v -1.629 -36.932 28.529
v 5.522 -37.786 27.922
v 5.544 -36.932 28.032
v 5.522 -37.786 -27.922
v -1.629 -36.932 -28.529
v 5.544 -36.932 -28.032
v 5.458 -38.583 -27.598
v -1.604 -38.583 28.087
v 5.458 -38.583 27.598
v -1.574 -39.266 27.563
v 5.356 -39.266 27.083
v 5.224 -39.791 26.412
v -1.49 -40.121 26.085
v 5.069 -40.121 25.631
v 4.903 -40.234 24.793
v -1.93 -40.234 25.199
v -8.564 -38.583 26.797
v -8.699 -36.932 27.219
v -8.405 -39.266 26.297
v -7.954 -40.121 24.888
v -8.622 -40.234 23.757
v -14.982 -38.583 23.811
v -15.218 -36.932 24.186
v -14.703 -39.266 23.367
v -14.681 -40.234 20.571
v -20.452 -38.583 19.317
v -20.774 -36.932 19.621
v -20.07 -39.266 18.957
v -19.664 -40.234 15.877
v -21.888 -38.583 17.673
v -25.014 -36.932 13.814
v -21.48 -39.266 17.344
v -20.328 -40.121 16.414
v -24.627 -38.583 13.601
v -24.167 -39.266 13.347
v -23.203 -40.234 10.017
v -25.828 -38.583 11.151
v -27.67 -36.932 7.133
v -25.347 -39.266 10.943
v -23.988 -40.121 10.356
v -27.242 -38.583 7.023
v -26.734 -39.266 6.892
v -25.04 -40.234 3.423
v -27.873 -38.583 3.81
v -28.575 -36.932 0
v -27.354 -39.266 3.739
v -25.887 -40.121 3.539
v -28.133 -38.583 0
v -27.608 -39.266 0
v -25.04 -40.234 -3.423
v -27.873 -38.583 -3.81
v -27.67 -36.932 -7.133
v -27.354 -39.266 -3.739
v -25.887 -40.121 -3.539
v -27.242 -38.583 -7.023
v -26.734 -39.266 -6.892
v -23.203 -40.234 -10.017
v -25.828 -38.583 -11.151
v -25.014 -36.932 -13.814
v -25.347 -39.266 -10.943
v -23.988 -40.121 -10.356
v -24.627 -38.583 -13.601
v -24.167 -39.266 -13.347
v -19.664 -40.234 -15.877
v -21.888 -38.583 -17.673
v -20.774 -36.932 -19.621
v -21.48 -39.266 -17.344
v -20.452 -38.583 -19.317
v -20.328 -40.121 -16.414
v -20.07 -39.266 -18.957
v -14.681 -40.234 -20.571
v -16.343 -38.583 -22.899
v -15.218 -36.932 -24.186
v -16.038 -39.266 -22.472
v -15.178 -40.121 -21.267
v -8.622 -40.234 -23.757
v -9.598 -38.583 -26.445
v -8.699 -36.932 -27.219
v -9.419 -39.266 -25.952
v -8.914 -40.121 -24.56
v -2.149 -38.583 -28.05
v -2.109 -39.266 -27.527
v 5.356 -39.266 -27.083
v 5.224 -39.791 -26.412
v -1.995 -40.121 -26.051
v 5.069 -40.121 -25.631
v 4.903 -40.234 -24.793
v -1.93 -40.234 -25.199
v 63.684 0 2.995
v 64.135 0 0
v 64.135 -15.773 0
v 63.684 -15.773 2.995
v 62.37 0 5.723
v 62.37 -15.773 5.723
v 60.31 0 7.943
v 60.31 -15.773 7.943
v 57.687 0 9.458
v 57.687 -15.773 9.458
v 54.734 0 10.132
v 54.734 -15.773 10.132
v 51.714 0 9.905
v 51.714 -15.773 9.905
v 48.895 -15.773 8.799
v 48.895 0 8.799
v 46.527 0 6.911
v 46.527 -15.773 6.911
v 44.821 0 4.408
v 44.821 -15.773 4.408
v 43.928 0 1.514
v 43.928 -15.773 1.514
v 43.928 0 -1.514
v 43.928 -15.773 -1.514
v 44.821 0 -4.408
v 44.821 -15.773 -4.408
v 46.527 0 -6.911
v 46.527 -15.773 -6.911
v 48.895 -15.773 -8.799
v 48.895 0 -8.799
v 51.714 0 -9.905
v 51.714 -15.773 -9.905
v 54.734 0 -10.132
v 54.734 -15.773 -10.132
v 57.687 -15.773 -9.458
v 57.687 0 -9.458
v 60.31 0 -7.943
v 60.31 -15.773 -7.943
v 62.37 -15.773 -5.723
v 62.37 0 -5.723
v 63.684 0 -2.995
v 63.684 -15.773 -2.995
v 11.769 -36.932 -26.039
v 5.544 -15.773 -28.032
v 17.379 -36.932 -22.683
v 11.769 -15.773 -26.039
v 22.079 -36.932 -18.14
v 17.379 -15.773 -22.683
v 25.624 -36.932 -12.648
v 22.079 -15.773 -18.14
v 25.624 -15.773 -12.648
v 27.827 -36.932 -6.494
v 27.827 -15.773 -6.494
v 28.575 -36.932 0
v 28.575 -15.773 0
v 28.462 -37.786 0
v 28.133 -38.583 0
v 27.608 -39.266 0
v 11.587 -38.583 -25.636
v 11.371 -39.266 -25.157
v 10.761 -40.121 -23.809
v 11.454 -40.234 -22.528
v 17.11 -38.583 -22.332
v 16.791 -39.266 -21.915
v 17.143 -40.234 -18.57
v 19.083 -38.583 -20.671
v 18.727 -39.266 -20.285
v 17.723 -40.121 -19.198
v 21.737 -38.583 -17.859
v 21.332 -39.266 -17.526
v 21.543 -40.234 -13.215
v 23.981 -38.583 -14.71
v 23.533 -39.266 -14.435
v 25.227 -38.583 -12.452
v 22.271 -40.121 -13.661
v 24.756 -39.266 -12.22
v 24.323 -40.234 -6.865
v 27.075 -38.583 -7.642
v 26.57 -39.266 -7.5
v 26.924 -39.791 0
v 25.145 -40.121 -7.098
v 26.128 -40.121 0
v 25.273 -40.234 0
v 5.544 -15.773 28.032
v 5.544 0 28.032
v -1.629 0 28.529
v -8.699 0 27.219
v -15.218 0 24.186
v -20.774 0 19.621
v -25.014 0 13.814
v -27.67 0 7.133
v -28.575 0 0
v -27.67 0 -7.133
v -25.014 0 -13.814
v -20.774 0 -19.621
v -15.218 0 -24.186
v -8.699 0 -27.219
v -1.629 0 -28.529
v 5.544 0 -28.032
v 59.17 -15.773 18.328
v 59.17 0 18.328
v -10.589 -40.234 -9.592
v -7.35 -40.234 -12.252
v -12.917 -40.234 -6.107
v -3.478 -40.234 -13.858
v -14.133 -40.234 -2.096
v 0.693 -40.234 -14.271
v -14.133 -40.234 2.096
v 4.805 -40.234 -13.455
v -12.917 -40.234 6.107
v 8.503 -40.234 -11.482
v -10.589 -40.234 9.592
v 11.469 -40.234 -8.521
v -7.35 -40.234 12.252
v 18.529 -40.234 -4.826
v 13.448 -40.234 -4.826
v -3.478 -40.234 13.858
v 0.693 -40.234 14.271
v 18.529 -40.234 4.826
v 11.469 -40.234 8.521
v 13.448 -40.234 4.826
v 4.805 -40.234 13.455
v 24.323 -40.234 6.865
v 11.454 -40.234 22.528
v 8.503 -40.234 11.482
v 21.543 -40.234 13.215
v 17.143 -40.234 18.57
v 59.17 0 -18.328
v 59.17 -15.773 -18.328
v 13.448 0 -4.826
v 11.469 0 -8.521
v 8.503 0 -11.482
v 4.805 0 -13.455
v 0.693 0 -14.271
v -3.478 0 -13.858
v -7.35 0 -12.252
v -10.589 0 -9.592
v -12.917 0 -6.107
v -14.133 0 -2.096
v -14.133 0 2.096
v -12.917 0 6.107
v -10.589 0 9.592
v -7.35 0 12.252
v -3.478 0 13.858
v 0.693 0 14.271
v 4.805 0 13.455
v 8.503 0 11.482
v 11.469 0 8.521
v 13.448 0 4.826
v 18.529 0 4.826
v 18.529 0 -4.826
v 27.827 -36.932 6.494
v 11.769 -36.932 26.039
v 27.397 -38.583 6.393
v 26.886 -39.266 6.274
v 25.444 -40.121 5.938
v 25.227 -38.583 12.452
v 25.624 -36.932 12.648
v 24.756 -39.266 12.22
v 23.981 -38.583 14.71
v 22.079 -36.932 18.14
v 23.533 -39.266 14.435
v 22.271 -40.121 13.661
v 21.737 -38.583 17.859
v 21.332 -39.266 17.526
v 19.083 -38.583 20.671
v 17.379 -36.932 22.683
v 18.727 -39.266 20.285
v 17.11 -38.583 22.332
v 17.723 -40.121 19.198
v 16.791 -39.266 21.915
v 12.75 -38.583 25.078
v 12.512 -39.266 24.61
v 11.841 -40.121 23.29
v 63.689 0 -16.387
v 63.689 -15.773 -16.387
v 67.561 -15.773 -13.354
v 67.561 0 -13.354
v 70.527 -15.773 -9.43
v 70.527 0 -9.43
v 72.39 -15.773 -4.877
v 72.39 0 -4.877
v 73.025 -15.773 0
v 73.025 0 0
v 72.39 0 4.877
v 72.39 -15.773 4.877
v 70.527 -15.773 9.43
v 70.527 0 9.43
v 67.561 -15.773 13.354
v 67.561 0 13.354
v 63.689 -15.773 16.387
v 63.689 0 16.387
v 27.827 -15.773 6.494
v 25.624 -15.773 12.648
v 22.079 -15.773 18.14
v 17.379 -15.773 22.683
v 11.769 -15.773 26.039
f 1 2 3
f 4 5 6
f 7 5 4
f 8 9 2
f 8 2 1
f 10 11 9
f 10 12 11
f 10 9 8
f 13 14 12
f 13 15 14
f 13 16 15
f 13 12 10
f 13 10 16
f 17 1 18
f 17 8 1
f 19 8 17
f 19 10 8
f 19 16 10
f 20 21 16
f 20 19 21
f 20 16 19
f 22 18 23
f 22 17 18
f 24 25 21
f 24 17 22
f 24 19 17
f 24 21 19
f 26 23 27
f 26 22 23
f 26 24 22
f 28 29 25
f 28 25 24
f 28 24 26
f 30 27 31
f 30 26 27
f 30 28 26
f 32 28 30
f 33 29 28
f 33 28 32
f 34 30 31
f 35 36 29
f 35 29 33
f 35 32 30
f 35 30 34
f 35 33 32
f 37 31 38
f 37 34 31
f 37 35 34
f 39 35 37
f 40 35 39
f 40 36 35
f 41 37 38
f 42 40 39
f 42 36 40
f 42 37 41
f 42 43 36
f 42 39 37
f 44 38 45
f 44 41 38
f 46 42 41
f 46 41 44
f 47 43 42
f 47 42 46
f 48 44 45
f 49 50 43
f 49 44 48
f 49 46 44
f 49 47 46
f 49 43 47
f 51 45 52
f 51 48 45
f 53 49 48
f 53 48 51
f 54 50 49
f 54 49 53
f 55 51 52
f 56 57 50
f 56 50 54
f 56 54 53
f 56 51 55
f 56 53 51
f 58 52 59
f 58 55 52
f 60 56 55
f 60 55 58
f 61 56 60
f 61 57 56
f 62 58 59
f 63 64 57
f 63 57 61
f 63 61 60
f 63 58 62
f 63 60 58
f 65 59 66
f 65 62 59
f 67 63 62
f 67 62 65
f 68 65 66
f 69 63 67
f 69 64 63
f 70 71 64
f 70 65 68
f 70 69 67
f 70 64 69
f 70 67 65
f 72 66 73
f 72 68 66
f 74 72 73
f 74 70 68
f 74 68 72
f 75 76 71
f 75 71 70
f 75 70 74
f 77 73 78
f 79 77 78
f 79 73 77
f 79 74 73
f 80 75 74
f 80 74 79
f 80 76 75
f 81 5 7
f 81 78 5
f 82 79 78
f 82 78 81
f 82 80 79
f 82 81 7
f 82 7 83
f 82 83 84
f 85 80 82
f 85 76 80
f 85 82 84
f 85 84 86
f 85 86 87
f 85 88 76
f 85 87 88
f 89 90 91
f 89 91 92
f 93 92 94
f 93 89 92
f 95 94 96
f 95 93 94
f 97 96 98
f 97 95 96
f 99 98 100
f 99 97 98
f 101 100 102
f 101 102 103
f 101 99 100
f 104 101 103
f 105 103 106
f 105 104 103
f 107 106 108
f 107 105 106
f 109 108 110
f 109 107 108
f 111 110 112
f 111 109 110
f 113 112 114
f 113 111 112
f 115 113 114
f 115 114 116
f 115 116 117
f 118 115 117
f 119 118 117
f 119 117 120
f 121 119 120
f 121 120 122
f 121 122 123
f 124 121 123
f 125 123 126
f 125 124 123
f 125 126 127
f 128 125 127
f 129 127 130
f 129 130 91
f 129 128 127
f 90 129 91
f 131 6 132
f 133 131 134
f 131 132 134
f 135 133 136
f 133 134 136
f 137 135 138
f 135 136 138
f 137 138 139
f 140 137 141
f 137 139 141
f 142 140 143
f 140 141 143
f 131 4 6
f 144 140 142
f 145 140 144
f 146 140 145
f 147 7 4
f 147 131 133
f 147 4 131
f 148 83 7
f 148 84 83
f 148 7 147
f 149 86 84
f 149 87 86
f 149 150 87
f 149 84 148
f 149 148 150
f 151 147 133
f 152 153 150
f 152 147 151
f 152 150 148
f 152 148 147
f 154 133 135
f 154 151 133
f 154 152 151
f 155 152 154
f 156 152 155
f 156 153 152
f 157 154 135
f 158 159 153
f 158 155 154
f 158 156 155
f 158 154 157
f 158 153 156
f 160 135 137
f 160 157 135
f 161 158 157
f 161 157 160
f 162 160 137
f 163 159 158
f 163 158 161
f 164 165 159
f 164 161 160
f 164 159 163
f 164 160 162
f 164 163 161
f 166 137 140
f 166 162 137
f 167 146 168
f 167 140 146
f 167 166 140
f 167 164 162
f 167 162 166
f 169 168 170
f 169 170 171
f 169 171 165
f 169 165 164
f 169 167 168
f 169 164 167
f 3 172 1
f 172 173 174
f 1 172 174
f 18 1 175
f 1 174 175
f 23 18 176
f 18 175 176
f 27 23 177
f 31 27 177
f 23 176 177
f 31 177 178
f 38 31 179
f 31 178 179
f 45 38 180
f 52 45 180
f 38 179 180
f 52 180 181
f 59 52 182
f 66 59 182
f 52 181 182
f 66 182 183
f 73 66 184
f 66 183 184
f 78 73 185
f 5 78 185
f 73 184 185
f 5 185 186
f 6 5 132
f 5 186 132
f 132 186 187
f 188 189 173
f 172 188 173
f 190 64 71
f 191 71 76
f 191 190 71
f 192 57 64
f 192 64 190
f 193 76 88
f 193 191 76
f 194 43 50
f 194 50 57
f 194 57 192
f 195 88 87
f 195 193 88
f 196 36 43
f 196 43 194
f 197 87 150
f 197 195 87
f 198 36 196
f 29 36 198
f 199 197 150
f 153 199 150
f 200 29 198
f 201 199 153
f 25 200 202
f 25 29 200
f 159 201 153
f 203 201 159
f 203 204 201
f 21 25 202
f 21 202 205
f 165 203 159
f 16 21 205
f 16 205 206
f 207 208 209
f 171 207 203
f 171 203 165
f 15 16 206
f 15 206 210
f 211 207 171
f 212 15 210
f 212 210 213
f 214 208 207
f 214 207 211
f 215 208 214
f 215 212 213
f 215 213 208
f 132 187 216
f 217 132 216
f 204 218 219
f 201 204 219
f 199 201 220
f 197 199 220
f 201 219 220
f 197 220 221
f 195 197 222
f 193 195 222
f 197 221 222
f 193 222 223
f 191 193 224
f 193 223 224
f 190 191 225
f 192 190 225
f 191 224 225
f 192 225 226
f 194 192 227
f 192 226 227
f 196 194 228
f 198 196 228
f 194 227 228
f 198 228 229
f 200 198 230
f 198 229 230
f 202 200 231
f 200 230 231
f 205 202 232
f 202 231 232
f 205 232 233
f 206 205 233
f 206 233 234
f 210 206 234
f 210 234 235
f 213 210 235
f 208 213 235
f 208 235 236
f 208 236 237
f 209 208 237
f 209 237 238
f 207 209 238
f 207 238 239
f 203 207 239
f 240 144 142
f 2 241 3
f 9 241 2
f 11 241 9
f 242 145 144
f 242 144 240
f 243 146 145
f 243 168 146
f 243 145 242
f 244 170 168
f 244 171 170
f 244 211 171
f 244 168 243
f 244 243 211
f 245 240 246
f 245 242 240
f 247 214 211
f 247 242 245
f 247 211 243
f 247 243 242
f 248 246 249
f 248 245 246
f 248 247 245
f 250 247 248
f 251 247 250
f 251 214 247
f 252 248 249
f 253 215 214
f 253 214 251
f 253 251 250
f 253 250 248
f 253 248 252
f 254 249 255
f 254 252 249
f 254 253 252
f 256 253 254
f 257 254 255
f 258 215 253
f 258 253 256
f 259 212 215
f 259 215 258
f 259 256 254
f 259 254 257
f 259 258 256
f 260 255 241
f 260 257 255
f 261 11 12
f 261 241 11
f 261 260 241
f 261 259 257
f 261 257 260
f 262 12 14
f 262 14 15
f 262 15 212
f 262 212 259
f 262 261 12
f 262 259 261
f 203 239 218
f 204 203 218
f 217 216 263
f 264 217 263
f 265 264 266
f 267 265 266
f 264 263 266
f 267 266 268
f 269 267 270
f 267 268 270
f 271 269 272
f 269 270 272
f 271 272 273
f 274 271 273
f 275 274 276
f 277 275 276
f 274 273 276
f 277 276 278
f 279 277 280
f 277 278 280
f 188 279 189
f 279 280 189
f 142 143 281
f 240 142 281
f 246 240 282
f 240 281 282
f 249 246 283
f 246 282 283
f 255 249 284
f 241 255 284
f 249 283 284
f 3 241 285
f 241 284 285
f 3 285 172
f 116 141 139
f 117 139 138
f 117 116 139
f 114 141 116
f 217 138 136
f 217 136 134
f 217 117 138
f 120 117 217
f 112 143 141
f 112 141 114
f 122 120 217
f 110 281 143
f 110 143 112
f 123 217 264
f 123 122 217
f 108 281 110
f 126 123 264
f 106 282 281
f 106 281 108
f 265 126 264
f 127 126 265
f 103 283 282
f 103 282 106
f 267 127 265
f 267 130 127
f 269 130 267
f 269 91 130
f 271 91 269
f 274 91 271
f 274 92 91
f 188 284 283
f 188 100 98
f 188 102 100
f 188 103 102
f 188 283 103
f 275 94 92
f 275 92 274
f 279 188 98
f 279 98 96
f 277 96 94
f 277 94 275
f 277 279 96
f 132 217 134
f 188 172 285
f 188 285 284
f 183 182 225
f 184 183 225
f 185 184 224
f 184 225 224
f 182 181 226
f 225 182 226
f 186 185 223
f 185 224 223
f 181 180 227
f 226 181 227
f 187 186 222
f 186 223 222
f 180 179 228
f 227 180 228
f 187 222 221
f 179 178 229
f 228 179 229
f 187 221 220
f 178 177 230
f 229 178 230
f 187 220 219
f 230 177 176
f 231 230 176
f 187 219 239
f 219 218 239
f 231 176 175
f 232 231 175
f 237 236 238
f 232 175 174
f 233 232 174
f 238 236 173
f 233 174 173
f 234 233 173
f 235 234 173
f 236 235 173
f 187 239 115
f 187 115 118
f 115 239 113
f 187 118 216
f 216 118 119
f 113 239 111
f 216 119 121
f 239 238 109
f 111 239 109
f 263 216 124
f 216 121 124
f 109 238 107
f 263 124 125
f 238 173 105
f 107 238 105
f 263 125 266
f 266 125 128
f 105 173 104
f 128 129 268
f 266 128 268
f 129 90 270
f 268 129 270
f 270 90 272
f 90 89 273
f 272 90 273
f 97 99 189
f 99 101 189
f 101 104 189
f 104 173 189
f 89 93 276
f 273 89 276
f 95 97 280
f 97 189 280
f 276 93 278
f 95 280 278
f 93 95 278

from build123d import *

# Parameters (mm, degrees)
F1_DEPTH = 40.2336
F0_R     = 10.16
F2_DEPTH = 15.7734
F3_R     = 3.302


with BuildPart() as f1:
    # F0 (on Front) → F1 (new body)
    with BuildSketch(Plane.XZ):
        with BuildLine():
            ThreePointArc((5.543906, -28.032048), (22.07881, -18.139922), (28.575, 0))
            ThreePointArc((28.575, 0), (22.07881, 18.139922), (5.543906, 28.032048))
            ThreePointArc((5.543906, 28.032048), (-28.575, 0), (5.543906, -28.032048))
        make_face()
        with BuildLine():
            ThreePointArc((13.447765, -4.826), (-14.2875, 0), (13.447765, 4.826))
            Line((13.447765, 4.826), (18.5293, 4.826))
            Line((18.5293, 4.826), (18.5293, -4.826))
            Line((18.5293, -4.826), (13.447765, -4.826))
        make_face(mode=Mode.SUBTRACT)
    extrude(amount=F1_DEPTH)

    # F0 (on Front) → F2 (join)
    with BuildSketch(Plane.XZ):
        with BuildLine():
            ThreePointArc((5.543906, 28.032048), (22.07881, 18.139922), (28.575, 0))
            ThreePointArc((28.575, 0), (22.07881, -18.139922), (5.543906, -28.032048))
            Line((5.543906, -28.032048), (59.169933, -18.327989))
            ThreePointArc((59.169933, -18.327989), (69.171479, -11.487798), (73.025, 0))
            ThreePointArc((73.025, 0), (69.171479, 11.487798), (59.169933, 18.327989))
            Line((59.169933, 18.327989), (5.543906, 28.032048))
        make_face()
        with Locations((53.975, 0)):
            Circle(F0_R, mode=Mode.SUBTRACT)
    extrude(amount=F2_DEPTH)

    # F3
    f3_edges = [f1.edges().sort_by_distance(p)[0] for p in [
        (-5.543906, -40.2336, 28.032048),
    ]]
    fillet(f3_edges, radius=F3_R)


solid = f1.part
